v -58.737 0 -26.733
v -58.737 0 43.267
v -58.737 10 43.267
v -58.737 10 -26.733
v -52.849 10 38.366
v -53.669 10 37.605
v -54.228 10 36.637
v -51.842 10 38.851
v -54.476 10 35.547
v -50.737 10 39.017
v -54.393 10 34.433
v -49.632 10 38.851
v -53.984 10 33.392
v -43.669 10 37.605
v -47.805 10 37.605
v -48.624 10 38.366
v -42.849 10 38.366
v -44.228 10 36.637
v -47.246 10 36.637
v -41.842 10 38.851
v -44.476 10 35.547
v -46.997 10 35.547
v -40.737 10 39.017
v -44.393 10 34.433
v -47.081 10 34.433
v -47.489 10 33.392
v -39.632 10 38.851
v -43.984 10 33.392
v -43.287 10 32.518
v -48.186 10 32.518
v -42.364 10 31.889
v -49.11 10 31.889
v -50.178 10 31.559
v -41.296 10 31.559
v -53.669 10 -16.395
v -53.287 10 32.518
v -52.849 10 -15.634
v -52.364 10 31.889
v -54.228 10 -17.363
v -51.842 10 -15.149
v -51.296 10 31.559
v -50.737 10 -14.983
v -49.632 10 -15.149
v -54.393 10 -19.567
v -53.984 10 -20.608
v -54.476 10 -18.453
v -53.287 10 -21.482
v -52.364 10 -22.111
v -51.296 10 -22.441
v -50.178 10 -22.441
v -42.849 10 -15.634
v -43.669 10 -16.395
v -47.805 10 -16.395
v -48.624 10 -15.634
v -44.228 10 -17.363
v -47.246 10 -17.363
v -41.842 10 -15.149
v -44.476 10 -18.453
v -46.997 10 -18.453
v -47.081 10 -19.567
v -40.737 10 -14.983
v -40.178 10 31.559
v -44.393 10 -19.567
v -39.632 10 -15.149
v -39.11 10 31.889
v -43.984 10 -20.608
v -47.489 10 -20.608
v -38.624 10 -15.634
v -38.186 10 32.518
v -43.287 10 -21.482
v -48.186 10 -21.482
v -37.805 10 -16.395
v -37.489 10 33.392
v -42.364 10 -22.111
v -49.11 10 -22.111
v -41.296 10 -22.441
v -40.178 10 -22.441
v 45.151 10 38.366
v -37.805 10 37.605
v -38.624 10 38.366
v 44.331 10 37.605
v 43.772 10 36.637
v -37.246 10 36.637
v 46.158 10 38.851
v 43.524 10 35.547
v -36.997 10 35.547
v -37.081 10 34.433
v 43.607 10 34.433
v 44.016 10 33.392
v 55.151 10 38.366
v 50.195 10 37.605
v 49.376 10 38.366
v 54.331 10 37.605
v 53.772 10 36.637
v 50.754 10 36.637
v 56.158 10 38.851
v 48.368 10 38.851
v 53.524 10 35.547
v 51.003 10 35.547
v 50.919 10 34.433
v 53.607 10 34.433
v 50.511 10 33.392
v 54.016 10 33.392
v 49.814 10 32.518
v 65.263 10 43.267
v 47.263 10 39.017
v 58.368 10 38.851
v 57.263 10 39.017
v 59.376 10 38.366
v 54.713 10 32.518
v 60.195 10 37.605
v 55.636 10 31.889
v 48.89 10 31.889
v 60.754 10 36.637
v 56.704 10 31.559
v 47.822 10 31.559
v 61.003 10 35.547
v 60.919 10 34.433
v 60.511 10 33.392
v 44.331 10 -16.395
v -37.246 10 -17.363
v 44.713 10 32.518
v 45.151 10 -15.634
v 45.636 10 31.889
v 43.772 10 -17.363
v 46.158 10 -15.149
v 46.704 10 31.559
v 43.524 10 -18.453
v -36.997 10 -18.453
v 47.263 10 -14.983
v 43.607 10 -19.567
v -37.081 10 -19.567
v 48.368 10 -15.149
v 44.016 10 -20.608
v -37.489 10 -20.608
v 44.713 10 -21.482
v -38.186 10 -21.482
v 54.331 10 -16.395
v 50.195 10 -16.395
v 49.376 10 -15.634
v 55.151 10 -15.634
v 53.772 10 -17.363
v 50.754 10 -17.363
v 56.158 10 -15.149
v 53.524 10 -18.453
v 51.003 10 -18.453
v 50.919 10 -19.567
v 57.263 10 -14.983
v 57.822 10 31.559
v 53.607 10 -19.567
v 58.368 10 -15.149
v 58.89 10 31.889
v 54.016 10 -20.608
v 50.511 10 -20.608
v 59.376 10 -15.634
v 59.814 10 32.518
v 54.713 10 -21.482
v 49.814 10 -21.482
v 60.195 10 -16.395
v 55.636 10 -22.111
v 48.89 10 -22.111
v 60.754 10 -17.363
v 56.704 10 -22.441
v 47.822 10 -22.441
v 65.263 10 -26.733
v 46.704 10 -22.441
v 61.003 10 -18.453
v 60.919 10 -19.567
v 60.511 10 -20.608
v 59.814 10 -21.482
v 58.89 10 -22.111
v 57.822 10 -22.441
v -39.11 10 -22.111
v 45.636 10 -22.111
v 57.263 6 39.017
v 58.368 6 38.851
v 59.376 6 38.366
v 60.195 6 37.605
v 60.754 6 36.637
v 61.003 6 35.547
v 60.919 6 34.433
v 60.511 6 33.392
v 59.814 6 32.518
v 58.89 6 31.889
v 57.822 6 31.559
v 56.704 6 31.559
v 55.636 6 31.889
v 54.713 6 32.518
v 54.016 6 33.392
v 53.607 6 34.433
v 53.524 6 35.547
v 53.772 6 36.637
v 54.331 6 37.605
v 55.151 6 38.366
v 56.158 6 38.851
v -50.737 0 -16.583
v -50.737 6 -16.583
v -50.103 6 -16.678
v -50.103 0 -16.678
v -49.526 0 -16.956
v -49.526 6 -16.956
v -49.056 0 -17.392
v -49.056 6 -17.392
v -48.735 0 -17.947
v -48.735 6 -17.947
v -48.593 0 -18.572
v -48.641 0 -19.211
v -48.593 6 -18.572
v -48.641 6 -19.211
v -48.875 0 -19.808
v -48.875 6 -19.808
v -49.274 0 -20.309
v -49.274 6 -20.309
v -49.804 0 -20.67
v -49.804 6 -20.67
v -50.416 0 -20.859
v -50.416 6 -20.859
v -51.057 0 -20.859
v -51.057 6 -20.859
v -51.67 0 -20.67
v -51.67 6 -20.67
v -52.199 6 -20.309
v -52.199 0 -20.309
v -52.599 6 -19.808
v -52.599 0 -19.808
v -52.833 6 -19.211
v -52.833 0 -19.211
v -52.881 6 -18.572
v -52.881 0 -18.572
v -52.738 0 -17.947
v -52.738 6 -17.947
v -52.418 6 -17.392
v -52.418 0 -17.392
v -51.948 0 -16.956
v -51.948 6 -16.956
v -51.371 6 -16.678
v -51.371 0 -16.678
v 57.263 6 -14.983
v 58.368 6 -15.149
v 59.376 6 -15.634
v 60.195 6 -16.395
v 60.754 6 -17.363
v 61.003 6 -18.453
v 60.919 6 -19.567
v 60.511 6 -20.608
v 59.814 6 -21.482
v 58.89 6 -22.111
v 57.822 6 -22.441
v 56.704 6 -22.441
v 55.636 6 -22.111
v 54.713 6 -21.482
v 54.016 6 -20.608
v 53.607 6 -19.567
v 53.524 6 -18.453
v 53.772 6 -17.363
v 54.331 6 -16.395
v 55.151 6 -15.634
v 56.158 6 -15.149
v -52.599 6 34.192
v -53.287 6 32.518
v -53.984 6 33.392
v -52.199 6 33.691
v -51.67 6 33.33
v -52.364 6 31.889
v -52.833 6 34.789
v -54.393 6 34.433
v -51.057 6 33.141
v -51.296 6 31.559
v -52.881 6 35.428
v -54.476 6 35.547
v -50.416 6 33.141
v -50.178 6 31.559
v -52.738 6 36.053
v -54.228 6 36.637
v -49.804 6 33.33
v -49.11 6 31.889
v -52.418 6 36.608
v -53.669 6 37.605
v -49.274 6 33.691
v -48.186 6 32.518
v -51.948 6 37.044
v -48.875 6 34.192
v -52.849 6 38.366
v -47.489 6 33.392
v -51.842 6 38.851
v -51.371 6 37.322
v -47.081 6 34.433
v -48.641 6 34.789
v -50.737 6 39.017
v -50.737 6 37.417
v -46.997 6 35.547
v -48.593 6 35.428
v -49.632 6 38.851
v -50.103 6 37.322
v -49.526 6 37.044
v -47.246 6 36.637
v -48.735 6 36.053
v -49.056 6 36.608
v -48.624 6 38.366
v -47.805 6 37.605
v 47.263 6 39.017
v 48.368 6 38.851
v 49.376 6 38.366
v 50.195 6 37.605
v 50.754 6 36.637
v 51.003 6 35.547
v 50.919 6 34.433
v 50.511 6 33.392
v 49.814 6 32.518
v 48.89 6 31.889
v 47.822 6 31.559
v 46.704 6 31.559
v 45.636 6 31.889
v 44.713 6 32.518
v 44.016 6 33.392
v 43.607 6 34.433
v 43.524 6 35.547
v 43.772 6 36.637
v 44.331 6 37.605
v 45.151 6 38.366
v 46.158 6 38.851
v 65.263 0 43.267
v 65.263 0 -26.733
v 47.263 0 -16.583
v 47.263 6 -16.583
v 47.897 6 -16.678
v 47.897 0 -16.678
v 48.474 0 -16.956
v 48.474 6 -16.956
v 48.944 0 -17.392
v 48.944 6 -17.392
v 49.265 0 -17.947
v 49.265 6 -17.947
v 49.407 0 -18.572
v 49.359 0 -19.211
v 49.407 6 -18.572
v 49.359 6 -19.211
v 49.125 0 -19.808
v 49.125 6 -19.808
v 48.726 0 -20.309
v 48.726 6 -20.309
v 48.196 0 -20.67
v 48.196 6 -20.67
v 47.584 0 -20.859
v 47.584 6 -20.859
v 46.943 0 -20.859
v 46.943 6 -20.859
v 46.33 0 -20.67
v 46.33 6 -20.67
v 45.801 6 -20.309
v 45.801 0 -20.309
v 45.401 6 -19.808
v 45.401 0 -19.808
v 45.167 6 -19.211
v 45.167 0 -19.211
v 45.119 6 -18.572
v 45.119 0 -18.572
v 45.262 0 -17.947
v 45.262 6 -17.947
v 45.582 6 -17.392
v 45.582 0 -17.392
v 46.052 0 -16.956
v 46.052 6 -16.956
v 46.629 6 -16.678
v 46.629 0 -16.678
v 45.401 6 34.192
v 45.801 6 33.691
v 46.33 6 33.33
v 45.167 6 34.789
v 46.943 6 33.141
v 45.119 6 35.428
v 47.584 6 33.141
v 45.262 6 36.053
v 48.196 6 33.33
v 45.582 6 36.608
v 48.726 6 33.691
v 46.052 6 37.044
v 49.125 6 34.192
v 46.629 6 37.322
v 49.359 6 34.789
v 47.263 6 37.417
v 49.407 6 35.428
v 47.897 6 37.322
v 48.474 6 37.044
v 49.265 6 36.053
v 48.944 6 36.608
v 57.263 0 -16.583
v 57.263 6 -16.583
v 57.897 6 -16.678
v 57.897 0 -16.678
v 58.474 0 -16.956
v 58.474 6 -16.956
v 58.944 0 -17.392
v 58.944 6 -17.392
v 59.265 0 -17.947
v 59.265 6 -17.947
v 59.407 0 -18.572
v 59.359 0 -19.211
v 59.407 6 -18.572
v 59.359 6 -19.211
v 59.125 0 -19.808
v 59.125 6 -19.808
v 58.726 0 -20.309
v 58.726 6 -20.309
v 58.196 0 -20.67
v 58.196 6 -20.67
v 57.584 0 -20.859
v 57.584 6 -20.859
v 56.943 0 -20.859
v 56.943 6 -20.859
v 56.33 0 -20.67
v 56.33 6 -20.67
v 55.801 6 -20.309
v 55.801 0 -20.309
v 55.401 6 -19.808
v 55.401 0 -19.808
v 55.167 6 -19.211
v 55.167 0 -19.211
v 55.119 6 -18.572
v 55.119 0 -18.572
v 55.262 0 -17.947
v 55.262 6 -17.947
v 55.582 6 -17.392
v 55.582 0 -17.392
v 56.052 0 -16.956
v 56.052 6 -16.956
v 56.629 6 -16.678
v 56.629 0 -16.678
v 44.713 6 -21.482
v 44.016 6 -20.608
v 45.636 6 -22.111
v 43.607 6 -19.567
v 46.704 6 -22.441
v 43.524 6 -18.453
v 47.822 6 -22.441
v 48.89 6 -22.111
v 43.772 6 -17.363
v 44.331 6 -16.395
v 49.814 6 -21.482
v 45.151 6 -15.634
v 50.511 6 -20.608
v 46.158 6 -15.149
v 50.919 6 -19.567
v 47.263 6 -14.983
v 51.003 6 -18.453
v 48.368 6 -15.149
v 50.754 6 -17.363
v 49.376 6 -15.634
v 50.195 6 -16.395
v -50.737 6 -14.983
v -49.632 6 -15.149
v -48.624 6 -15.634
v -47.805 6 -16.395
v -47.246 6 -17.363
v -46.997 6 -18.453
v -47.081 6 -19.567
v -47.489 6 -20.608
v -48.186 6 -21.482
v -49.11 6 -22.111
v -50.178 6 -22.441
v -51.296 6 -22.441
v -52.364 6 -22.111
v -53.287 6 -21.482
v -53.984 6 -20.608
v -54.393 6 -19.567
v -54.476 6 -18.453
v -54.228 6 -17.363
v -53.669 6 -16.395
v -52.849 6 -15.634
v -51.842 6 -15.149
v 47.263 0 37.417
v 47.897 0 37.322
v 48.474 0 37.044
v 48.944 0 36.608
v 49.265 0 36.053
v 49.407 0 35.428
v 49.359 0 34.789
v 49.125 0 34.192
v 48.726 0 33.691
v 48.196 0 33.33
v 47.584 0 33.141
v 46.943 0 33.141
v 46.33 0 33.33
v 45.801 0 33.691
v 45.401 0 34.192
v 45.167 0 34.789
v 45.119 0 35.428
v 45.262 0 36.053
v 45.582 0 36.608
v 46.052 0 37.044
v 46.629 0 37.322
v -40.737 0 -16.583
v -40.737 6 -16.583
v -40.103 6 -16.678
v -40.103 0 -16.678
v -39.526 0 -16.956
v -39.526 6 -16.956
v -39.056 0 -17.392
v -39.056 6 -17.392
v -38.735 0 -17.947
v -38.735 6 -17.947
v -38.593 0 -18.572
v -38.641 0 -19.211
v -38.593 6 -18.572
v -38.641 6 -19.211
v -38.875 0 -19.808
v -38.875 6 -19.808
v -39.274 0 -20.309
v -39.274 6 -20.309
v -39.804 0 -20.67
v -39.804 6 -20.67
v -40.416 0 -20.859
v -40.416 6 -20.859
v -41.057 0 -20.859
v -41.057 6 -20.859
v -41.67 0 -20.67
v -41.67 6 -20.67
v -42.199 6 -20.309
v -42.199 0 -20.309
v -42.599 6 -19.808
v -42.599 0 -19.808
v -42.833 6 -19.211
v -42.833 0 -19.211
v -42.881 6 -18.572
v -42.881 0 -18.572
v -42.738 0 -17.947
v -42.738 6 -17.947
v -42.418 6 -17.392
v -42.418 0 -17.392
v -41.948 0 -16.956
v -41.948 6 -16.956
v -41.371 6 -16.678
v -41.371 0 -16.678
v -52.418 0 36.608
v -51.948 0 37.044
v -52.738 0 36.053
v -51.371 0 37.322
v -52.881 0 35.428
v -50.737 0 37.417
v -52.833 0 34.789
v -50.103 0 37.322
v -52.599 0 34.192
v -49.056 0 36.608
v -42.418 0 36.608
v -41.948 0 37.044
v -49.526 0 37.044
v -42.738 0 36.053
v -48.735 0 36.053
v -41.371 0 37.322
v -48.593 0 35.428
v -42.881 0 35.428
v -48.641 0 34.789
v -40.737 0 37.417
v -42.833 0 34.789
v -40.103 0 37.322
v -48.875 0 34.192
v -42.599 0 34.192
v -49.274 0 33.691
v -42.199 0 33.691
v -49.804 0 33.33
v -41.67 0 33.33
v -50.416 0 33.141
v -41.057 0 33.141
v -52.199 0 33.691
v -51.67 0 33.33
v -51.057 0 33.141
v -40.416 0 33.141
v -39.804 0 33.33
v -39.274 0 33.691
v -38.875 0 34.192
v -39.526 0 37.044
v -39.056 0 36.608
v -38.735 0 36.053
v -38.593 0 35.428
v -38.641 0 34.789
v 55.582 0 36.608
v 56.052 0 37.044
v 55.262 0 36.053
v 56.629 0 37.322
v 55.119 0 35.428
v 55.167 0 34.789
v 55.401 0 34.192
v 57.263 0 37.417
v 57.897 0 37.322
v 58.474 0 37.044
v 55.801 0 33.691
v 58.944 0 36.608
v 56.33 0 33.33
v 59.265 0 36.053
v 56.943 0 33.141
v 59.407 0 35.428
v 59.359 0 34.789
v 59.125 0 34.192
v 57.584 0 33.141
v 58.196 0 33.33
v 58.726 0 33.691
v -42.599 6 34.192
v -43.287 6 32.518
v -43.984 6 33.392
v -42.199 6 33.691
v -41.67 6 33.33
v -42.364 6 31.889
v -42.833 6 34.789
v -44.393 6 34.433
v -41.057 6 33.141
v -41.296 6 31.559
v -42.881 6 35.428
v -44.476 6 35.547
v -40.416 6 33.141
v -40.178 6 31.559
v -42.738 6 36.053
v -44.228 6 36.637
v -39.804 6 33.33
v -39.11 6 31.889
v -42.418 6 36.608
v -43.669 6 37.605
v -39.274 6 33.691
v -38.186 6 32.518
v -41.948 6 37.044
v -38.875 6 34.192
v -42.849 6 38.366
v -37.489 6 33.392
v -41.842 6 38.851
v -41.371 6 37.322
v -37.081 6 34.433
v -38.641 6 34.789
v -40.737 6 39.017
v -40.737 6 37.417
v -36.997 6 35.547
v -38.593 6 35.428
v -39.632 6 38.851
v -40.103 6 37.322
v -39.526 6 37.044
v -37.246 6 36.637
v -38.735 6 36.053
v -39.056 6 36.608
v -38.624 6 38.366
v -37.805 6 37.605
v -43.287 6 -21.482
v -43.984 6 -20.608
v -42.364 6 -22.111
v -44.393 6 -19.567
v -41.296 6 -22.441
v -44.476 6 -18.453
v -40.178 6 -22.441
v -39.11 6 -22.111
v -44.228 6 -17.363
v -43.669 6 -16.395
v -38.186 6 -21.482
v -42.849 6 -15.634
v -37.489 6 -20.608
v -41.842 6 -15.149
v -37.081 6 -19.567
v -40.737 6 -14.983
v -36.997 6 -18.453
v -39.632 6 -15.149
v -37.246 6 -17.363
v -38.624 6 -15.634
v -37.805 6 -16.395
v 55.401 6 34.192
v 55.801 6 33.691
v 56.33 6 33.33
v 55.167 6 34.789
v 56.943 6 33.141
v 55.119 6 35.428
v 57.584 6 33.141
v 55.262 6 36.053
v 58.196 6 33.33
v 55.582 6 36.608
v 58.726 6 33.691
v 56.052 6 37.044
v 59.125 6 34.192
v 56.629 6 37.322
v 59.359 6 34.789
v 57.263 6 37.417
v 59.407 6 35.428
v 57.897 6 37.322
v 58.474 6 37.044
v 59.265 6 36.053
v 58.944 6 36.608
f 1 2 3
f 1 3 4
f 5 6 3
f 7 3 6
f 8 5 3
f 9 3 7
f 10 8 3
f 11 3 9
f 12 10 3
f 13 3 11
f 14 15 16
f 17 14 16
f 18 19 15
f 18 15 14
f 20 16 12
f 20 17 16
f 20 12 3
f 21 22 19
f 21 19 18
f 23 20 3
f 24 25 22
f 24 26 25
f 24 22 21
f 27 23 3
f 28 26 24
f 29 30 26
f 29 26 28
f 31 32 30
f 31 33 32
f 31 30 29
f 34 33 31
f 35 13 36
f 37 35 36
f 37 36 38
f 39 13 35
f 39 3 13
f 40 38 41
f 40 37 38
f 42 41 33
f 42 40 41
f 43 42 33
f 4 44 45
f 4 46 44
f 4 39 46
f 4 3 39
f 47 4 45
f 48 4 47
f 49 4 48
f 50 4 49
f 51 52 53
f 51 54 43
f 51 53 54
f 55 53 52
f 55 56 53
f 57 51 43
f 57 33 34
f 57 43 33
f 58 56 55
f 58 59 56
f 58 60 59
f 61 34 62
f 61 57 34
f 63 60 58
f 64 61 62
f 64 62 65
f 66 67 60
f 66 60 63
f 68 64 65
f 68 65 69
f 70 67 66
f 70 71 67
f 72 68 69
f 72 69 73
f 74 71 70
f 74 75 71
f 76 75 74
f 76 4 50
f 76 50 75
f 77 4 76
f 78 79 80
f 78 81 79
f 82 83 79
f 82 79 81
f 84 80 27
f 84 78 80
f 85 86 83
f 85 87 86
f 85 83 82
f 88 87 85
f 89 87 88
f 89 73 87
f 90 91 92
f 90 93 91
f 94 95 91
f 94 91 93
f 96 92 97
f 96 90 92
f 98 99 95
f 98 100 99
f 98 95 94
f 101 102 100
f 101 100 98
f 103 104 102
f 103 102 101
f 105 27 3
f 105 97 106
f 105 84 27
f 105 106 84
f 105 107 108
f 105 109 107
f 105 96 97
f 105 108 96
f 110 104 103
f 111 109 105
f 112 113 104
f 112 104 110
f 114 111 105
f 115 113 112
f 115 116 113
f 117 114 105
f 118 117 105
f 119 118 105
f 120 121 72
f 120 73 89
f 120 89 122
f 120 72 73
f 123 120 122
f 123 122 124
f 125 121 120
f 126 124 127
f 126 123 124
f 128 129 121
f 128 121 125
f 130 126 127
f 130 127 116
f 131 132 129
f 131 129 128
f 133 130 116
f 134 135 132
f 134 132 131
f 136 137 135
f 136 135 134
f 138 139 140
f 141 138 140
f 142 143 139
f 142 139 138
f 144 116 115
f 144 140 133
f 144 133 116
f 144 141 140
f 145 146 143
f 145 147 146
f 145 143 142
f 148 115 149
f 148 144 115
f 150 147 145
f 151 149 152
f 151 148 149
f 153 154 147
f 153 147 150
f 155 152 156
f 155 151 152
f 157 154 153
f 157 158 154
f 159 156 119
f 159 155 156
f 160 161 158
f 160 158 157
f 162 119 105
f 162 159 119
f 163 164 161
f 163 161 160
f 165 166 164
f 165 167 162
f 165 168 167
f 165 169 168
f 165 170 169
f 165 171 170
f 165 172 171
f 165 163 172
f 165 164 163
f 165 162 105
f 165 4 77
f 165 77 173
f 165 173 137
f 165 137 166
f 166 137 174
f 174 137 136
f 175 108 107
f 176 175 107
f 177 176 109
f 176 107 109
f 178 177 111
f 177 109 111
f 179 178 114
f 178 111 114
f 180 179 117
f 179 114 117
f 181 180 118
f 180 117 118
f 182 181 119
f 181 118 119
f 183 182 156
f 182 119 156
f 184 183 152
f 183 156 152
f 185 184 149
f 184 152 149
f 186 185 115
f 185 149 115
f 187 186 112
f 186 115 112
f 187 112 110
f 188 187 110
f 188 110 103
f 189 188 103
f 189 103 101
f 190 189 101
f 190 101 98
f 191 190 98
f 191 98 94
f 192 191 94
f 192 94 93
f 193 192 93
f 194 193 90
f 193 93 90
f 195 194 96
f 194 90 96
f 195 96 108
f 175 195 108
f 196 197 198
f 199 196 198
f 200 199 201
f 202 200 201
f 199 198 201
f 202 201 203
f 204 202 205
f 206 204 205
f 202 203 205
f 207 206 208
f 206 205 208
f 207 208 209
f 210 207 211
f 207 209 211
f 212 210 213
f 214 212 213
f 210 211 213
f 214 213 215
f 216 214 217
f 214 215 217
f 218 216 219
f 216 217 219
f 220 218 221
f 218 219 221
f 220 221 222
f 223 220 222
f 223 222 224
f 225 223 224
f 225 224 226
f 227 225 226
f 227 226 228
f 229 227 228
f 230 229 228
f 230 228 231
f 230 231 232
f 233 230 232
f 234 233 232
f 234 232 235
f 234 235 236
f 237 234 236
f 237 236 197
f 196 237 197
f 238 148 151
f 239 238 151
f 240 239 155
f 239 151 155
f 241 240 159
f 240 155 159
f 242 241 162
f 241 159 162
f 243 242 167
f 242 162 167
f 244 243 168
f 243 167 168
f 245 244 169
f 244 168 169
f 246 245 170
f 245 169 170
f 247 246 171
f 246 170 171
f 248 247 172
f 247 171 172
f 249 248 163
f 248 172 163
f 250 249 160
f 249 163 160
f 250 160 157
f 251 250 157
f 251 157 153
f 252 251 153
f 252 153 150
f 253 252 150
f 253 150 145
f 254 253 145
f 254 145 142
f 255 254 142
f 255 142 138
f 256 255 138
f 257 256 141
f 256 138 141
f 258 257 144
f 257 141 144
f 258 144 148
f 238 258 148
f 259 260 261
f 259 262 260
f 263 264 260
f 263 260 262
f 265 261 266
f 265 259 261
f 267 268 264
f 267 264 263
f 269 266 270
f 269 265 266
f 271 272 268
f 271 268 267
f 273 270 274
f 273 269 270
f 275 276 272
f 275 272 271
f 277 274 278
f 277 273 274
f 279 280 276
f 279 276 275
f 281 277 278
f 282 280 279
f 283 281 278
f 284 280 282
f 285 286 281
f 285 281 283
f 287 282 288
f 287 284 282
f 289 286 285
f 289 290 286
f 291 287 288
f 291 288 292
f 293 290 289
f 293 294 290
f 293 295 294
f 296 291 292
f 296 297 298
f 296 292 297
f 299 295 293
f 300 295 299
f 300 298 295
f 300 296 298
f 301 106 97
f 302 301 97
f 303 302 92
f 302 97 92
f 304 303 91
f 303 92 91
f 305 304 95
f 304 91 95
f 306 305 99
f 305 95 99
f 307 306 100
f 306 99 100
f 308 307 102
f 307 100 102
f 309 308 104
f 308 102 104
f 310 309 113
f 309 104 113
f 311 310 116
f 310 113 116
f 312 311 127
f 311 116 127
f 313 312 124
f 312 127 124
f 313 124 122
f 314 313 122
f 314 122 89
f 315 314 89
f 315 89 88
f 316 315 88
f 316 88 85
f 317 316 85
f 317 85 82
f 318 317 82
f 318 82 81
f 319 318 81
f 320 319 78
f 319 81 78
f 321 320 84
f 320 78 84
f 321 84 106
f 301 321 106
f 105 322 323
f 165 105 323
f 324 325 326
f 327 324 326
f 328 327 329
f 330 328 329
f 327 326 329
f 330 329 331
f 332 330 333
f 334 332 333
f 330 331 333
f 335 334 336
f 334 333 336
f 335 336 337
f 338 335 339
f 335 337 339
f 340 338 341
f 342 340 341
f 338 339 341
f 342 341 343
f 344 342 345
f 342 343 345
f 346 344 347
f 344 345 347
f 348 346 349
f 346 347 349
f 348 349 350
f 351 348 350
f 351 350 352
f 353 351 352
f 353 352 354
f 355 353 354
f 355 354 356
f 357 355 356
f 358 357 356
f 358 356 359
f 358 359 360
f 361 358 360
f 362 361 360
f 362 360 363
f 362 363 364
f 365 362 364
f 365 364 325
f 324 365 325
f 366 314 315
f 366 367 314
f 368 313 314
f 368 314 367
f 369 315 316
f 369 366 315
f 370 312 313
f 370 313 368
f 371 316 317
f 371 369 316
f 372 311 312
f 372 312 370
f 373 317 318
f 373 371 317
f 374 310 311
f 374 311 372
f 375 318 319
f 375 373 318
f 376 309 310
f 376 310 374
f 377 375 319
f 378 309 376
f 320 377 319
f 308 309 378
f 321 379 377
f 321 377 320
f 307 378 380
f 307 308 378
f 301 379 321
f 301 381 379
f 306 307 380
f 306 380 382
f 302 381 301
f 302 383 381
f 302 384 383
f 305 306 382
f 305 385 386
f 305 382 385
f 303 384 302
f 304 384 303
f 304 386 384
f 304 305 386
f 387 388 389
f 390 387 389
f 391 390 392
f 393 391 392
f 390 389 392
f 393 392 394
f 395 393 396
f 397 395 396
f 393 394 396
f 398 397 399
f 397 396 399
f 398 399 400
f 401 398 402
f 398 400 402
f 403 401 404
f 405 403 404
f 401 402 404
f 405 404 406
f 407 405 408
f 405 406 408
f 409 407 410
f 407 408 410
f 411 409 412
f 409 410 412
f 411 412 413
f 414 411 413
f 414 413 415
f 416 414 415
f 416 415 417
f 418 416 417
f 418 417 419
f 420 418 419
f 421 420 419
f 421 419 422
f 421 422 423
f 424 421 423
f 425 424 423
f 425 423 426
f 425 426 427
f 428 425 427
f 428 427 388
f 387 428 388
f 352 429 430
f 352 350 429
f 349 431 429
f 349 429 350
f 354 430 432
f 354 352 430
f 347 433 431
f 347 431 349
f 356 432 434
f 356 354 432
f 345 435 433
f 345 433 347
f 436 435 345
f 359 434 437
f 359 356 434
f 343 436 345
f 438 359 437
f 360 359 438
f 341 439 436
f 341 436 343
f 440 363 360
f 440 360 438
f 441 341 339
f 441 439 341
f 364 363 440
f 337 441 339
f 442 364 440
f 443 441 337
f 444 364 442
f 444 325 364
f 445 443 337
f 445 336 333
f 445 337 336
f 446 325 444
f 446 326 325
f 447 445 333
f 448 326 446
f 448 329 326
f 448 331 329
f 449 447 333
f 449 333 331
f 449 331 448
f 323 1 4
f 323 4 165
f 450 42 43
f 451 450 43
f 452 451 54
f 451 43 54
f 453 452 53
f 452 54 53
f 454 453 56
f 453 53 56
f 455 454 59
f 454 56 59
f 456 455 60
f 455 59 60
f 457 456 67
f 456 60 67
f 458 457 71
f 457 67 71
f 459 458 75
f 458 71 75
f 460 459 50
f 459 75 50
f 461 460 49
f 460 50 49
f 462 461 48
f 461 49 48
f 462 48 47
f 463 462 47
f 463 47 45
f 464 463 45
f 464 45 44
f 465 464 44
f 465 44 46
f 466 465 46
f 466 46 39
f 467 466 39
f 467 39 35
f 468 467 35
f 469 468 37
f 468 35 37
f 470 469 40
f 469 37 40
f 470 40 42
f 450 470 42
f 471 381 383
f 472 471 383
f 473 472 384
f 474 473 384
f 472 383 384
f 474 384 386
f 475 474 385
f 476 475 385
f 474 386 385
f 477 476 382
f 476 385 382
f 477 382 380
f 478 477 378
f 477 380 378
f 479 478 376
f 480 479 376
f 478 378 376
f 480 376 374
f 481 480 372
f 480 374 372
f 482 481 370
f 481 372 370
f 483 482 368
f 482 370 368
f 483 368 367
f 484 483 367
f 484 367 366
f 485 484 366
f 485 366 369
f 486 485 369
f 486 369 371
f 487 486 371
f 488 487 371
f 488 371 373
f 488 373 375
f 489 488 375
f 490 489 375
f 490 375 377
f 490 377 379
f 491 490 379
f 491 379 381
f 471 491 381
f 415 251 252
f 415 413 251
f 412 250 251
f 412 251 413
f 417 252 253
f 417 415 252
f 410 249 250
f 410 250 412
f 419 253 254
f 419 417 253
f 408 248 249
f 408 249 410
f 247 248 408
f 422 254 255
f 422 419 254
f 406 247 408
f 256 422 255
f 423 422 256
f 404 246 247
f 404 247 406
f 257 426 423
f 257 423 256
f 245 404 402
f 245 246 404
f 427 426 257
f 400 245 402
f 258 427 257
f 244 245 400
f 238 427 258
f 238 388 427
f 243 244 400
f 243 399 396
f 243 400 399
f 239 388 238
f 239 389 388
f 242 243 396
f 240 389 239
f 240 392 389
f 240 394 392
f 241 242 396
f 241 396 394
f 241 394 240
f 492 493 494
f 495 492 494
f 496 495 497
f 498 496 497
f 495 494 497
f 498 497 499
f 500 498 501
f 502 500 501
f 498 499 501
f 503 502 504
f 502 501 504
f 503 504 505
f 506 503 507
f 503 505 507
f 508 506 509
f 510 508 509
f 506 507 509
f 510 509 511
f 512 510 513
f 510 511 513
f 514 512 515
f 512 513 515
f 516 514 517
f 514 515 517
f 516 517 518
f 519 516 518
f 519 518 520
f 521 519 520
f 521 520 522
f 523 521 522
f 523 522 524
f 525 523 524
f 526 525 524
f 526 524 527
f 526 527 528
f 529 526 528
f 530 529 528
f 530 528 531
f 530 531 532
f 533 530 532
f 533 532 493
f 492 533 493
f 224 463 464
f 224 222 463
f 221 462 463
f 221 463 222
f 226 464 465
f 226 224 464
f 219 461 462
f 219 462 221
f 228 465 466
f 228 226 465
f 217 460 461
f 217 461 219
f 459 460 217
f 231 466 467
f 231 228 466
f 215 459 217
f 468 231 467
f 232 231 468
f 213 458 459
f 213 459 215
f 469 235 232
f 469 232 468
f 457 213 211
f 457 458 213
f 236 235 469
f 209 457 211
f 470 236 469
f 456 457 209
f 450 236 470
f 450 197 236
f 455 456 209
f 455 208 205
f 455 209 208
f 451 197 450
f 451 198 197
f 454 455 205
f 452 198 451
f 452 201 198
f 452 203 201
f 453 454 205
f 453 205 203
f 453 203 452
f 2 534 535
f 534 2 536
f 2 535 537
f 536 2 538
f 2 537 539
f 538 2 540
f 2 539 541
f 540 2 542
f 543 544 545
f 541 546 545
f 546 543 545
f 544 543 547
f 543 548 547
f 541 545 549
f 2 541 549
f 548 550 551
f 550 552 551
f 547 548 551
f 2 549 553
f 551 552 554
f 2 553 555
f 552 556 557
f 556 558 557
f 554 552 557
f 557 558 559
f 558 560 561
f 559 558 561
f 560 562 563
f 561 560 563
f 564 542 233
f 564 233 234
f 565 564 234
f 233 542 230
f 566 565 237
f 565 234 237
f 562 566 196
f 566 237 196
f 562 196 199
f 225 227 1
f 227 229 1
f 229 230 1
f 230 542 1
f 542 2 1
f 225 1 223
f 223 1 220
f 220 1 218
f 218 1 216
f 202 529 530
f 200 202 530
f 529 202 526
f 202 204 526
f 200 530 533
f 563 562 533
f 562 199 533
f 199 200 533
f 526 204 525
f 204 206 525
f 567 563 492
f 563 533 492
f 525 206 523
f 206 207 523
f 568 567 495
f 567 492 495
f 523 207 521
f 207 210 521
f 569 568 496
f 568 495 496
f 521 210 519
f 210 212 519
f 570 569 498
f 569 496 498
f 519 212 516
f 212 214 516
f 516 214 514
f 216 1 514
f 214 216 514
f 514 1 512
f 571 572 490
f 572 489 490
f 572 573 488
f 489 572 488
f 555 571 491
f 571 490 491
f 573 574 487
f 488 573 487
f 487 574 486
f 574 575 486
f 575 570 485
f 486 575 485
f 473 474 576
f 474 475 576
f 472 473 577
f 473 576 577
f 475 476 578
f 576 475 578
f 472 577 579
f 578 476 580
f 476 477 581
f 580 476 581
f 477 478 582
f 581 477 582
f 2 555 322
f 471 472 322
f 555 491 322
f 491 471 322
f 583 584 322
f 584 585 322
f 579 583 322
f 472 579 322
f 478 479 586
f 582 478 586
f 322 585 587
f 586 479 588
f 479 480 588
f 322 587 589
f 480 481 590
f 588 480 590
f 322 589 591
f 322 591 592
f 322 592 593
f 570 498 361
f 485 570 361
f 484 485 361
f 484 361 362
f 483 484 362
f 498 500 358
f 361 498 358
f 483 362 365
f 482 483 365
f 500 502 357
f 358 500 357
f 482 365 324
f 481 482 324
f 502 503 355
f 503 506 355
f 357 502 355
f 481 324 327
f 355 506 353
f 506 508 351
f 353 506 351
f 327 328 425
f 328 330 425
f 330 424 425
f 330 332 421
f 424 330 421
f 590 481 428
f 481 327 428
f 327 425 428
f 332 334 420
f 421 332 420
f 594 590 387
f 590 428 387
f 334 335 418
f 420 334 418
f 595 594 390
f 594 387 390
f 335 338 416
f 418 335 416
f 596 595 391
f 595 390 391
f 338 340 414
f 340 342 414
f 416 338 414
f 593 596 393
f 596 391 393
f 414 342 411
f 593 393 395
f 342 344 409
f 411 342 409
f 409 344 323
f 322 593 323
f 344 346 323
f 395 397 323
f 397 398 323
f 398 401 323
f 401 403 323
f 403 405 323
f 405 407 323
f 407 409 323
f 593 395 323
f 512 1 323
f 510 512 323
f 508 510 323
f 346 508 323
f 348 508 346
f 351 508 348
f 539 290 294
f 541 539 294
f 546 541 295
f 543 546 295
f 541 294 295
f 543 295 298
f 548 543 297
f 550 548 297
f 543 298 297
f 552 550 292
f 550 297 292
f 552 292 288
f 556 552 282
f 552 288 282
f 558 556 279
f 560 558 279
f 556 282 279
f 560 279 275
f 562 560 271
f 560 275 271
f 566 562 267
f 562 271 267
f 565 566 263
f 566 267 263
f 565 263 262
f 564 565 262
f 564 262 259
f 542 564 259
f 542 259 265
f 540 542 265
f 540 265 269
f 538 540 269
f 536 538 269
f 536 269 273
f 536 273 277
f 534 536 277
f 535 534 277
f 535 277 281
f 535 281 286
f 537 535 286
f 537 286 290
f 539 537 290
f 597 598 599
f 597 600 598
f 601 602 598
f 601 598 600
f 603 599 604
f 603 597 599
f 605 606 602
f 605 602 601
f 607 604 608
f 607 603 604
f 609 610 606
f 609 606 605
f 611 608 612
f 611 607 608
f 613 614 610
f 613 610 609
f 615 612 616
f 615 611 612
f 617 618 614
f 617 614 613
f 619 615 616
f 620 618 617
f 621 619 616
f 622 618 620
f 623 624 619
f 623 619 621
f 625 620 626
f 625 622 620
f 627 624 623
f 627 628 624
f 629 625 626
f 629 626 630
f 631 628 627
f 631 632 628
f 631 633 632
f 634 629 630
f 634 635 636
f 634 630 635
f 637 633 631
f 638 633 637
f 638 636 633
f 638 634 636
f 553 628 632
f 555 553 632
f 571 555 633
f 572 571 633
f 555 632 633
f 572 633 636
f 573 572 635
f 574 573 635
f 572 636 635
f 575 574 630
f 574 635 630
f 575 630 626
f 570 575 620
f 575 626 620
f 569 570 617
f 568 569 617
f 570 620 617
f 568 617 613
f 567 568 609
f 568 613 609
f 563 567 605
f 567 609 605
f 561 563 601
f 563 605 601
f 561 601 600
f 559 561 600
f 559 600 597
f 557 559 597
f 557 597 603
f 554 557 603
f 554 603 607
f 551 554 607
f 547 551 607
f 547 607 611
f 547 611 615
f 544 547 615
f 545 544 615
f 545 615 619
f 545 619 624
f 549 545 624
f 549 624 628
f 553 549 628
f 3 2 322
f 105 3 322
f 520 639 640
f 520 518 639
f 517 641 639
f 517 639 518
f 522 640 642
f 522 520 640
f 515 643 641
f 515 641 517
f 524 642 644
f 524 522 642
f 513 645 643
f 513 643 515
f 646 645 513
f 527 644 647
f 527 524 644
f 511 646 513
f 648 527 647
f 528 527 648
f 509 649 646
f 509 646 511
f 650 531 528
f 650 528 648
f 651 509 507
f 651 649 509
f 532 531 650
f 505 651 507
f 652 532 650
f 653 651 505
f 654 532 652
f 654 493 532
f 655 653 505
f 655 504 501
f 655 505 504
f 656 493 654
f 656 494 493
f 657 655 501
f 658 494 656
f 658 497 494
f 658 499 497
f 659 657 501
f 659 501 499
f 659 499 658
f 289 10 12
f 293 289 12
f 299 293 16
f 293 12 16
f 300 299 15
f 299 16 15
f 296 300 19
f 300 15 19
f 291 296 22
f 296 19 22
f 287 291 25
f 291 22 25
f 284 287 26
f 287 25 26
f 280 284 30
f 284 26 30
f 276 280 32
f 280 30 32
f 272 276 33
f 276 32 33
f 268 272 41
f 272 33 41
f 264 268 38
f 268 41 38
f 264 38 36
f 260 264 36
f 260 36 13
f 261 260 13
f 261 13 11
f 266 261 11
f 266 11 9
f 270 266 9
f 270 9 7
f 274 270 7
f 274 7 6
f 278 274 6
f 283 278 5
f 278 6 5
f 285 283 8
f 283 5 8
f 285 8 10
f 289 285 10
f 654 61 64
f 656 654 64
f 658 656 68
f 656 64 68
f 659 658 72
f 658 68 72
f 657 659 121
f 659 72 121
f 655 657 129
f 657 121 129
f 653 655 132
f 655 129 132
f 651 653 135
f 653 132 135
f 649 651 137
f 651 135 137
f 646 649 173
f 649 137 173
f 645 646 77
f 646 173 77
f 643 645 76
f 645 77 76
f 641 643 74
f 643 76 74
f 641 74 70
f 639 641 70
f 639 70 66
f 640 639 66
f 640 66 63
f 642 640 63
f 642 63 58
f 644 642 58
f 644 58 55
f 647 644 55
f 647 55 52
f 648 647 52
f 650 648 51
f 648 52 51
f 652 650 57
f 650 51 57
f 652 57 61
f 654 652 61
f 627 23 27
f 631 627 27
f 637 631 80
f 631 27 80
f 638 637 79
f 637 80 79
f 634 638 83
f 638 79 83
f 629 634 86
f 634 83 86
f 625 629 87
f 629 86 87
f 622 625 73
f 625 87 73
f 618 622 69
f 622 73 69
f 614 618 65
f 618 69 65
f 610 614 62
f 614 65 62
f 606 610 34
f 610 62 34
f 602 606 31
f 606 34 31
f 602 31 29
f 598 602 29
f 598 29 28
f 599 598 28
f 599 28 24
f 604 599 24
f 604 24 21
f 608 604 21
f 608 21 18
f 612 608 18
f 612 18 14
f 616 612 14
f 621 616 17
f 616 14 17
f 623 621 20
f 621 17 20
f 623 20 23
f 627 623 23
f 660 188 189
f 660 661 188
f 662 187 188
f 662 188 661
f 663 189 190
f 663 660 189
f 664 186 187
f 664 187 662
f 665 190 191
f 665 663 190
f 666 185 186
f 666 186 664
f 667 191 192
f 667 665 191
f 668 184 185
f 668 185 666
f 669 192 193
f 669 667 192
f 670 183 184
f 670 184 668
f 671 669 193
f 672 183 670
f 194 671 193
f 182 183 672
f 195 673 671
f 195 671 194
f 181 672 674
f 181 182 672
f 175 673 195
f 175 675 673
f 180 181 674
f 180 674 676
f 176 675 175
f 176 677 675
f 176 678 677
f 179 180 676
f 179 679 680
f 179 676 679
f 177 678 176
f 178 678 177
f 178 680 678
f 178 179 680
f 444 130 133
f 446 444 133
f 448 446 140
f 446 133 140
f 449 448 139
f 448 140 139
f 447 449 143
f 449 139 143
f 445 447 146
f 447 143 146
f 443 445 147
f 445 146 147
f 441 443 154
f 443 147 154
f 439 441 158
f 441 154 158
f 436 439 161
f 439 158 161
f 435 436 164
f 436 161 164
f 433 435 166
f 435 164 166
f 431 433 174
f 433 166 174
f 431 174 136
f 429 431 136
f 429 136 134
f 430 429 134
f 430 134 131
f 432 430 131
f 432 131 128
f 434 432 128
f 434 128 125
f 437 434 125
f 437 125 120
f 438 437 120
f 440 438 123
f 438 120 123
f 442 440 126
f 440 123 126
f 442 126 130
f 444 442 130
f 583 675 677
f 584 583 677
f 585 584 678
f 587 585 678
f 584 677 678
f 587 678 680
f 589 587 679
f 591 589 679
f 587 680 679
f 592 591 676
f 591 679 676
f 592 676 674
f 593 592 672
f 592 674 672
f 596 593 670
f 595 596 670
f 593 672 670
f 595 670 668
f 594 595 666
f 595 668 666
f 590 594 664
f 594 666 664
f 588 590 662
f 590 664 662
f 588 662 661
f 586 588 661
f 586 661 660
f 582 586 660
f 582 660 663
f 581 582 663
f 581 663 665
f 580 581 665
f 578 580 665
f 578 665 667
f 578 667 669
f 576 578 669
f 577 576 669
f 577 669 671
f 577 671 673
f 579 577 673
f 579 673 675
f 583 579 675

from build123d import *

# Parameters (mm, degrees)
SKETCH1_W           = 124
SKETCH1_H           = 70
BOSS_EXTRUDE1_DEPTH = 10
SKETCH11_R          = 2.15
CUT_EXTRUDE4_DEPTH  = 79.938779664
SKETCH17_R          = 3.75
CUT_EXTRUDE5_DEPTH  = 4


with BuildPart() as part:
    # Sketch1 → Boss-Extrude1 (new body)
    with BuildSketch(Plane(origin=(0, 0, 0), x_dir=(1, 0, 0), z_dir=(0, 1, 0))):
        with Locations((3.263157895, -8.267206478)):
            Rectangle(SKETCH1_W, SKETCH1_H)
    extrude(amount=BOSS_EXTRUDE1_DEPTH)

    # Sketch11 → Cut-Extrude4 (cut, through all)
    with BuildSketch(Plane(origin=(0, 10, 0), x_dir=(1, 0, 0), z_dir=(0, 1, 0))):
        with Locations(Location((-50.736842105, 18.732793522, 0), (0, 0, 270))):
            Circle(SKETCH11_R)
        with Locations(Location((-40.736842105, 18.732793522, 0), (0, 0, 270))):
            Circle(SKETCH11_R)
        with Locations(Location((-50.736842105, -35.267206478, 0), (0, 0, 270))):
            Circle(SKETCH11_R)
        with Locations(Location((-40.736842105, -35.267206478, 0), (0, 0, 270))):
            Circle(SKETCH11_R)
        with Locations(Location((47.263157895, 18.732793522, 0), (0, 0, 270))):
            Circle(SKETCH11_R)
        with Locations(Location((57.263157895, 18.732793522, 0), (0, 0, 270))):
            Circle(SKETCH11_R)
        with Locations(Location((47.263157895, -35.267206478, 0), (0, 0, 270))):
            Circle(SKETCH11_R)
        with Locations(Location((57.263157895, -35.267206478, 0), (0, 0, 270))):
            Circle(SKETCH11_R)
    extrude(amount=-CUT_EXTRUDE4_DEPTH, mode=Mode.SUBTRACT)

    # Sketch17 → Cut-Extrude5 (cut)
    with BuildSketch(Plane(origin=(0, 10, 0), x_dir=(1, 0, 0), z_dir=(0, 1, 0))):
        with Locations(Location((-50.736842105, 18.732793522, 0), (0, 0, 270))):
            Circle(SKETCH17_R)
        with Locations(Location((-40.736842105, 18.732793522, 0), (0, 0, 270))):
            Circle(SKETCH17_R)
        with Locations(Location((47.263157895, 18.732793522, 0), (0, 0, 270))):
            Circle(SKETCH17_R)
        with Locations(Location((57.263157895, 18.732793522, 0), (0, 0, 270))):
            Circle(SKETCH17_R)
        with Locations(Location((57.263157895, -35.267206478, 0), (0, 0, 270))):
            Circle(SKETCH17_R)
        with Locations(Location((47.263157895, -35.267206478, 0), (0, 0, 270))):
            Circle(SKETCH17_R)
        with Locations(Location((-40.736842105, -35.267206478, 0), (0, 0, 270))):
            Circle(SKETCH17_R)
        with Locations(Location((-50.736842105, -35.267206478, 0), (0, 0, 270))):
            Circle(SKETCH17_R)
    extrude(amount=-CUT_EXTRUDE5_DEPTH, mode=Mode.SUBTRACT)


solid = part.part
